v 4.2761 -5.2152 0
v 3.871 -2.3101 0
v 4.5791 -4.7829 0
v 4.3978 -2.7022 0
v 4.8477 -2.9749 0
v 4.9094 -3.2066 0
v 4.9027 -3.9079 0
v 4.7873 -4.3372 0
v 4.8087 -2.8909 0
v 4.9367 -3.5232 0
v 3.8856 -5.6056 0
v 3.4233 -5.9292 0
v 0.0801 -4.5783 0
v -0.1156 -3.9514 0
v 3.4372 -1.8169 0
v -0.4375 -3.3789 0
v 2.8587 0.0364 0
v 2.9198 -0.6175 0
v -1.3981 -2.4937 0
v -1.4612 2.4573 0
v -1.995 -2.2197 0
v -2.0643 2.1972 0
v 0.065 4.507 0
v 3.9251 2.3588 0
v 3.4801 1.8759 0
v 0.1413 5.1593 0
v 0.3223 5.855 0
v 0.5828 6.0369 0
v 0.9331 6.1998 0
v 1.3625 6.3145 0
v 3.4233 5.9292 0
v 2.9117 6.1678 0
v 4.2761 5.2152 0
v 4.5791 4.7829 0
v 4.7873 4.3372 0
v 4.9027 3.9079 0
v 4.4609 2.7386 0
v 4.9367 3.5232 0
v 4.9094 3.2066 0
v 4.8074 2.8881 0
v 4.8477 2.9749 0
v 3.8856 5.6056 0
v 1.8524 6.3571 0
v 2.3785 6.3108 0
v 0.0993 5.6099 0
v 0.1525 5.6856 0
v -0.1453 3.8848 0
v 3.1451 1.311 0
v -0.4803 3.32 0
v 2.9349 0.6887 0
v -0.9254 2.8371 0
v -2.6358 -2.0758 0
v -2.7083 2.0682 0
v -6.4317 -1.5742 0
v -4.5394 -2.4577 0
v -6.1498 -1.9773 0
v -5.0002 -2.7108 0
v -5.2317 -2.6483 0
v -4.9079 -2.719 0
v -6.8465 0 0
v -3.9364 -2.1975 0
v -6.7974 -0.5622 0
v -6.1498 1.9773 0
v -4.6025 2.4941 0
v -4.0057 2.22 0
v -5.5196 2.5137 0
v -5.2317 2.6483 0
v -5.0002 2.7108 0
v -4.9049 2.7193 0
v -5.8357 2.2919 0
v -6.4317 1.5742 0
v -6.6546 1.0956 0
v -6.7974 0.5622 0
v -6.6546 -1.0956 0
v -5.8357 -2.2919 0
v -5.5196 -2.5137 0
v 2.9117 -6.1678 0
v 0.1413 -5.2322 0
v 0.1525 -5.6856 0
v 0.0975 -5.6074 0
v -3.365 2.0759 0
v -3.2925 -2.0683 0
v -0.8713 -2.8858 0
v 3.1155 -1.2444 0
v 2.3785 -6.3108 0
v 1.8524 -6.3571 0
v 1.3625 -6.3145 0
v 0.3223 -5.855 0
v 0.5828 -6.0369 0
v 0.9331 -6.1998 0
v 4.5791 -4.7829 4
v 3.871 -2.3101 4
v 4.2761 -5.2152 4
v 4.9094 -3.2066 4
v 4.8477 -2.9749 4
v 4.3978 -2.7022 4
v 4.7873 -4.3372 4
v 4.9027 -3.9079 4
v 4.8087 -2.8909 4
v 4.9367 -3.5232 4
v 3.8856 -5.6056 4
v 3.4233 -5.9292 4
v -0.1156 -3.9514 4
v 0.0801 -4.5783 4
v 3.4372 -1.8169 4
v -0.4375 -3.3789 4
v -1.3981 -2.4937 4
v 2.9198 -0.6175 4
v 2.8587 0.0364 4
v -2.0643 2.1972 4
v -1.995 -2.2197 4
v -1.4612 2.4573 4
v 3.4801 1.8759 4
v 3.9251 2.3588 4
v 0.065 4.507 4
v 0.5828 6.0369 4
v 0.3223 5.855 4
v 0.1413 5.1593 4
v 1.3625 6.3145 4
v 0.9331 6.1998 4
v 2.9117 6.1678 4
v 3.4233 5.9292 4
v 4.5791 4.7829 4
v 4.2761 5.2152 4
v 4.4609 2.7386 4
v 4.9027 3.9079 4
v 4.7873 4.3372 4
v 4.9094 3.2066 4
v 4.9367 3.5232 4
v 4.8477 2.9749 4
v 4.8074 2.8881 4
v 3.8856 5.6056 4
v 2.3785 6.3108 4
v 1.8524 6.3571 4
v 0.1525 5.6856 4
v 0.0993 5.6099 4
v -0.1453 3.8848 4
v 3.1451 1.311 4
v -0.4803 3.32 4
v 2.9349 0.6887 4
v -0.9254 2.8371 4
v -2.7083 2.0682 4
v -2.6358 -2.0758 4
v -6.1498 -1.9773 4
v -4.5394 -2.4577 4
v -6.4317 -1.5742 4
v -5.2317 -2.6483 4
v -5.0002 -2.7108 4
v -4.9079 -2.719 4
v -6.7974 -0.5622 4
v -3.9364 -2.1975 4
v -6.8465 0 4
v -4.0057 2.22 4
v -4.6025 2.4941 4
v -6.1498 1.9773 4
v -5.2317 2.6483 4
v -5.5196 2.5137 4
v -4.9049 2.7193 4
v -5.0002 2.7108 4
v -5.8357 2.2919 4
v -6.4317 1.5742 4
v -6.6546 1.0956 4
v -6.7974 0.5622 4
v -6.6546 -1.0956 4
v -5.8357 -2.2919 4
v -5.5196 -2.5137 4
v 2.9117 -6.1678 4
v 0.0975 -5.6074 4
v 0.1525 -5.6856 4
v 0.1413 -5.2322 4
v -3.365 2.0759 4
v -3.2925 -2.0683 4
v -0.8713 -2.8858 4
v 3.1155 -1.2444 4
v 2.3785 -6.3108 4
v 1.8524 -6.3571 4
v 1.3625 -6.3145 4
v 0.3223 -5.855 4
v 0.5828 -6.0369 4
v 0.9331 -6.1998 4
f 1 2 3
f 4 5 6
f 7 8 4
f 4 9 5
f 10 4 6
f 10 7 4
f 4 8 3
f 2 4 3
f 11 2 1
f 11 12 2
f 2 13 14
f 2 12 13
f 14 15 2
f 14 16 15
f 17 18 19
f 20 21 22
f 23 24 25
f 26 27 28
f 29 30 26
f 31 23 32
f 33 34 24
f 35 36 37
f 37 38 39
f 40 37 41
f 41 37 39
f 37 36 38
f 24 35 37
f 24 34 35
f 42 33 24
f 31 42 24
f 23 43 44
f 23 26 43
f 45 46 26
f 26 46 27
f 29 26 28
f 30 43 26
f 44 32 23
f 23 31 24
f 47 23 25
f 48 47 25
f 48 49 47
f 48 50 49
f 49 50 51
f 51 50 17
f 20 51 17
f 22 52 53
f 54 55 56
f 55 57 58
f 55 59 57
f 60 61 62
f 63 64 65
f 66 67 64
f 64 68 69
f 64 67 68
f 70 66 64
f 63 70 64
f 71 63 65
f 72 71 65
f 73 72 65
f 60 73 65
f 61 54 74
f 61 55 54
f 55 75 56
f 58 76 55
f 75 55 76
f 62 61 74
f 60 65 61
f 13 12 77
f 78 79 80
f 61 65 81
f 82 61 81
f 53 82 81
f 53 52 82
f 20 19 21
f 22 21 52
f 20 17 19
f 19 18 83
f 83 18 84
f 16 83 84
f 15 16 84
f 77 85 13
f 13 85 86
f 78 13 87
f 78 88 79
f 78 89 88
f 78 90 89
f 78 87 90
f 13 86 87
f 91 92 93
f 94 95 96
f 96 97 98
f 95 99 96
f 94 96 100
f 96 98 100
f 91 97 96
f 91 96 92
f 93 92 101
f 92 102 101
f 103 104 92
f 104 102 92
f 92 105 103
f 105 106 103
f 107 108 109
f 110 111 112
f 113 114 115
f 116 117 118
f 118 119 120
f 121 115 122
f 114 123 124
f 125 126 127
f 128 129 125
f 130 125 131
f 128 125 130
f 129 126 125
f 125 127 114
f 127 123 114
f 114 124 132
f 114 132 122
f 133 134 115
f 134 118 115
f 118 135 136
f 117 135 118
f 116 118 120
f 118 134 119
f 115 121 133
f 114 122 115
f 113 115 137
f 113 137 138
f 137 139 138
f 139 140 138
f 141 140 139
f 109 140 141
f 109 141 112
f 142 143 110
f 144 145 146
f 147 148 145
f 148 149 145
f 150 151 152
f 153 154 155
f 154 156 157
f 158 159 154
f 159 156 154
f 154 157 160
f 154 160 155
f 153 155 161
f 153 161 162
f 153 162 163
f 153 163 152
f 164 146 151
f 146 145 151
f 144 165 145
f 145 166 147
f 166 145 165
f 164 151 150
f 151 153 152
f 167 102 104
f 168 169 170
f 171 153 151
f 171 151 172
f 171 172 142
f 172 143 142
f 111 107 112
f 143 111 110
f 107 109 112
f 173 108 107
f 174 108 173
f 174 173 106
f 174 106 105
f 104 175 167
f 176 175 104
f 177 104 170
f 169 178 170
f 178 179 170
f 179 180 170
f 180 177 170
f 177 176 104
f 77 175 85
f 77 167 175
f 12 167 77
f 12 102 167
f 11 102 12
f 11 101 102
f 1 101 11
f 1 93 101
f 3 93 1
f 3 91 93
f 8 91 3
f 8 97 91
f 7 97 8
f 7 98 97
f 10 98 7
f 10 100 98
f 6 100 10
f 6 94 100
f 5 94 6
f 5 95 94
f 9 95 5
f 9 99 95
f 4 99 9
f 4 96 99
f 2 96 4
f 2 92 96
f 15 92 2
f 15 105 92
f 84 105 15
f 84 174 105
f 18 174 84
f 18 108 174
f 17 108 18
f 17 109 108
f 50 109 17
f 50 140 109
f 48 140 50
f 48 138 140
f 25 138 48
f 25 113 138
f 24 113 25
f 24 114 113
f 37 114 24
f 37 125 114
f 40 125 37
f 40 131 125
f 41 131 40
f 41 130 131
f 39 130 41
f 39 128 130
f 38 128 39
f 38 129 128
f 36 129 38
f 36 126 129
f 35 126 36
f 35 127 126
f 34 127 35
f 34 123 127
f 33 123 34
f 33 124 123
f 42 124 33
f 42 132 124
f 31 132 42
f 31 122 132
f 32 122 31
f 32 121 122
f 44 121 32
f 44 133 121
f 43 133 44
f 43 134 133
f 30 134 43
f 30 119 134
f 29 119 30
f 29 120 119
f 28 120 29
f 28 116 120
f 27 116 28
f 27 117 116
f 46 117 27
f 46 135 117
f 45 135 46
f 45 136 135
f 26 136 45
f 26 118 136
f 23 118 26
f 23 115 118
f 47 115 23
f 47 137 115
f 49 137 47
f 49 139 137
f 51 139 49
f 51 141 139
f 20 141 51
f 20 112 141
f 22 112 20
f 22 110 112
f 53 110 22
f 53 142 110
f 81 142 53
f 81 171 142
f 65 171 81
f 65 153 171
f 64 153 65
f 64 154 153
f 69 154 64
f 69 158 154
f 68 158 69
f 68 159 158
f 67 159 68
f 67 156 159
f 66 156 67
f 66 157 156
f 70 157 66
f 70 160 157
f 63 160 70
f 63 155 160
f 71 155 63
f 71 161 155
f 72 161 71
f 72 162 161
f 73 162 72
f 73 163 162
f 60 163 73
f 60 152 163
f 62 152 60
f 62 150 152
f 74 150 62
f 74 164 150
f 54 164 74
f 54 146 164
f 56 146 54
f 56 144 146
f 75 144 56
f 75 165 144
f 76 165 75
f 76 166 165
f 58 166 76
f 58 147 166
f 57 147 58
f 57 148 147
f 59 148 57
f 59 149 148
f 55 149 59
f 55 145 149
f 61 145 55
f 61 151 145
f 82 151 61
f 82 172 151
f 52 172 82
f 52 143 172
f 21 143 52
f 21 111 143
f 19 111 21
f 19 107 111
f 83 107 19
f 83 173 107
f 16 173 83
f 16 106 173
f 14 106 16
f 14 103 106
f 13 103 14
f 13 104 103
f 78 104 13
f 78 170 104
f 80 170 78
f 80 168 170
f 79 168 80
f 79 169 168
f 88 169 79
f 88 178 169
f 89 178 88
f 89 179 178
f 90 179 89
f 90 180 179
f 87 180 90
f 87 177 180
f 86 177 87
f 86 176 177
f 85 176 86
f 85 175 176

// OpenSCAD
// file: libnema.scad
/*module cycloid(order=30, r=1,n=10,k=1){
     order=n*order;
     R=n*r;
     angles=[ for (i = [0:order-1]) i*(360/order) ];
     coords=[ for (th=angles) [(R-r)*cos(th)+r*cos(th*(R-r)/r), (R-r)*sin(th)-r*sin(th*(R-r)/r)] ];
     rof=r*k*3.1415*.5;
     offset(r=rof,$fn=30)
     polygon(coords);
 }
*/

module cycloid(order=30,r=1,n=10,k=1){
     order=n*order;
     angles=[ for (i = [0:order-1]) i*(360/order) ];
     coords=[ for (th=angles) [r*(n+1)*cos(th)-r*cos((n+1)*th),r*(n+1)*sin(th)-r*sin((n+1)*th)] ];
 rof=-r*k*3.1415*.5;
     offset(r=rof,$fn=30)
     polygon(coords);
}

 module engrane(n=16,rmod=1,rmul=3,ndientes=14){
    n=round(n);
n1=n*ndientes;
omega=360/n1;
theta=180/n1;
r1=rmod*n;
r2=rmul*rmod;
coord=[ for (i=[0:n1-1]) [(r1+r2*sin(i*360/ndientes+theta))*cos(omega*i),(r1+r2*sin(i*360/ndientes+theta))*sin(omega*i)] ];
polygon(coord);
};
 module nema17_holes(d=3){
    for(i=[0:3]){
        translate([31/1.414*cos(90*i+45),31/1.414*sin(90*i+45)])
        circle(d=d,$fn=30);} }

module nema17_eje(s=1){
 scale([s,s])
difference(){
circle(d=5,$fn=100);
translate([4,0])
square(size=[4,10],center=true);
}


module nema17_nut(h=3,d=10,s=1,e=1){
linear_extrude(h)
difference(){
circle(d=d2,$fn=100);
translate([0,e])
nema17_eje(s=s);
}}}


module lever(l=108,h=3,d=7){
    l1=l;
union(){
linear_extrude(h)
difference(){
square(size=[14,l1],center=true);
translate([0,l1/2-7.])
square(size=[10.4,10.4],center=true);
for(i=[1:4])
     translate([0,l1*.5-i*50])
     circle(d=3);
}

translate([0,l1/2-7.])
linear_extrude(h+2)
difference(){
circle(d=10*1.414+d);
//square(size=[14,14],center=true);
square(size=[10.3,10.3],center=true);
}
}

}

module nema17(h=10,d=0){
linear_extrude(h)
difference(){
  intersection(){
square(42,center=true);
    circle(d=54);}
    nema17_holes();
    circle(d=d);
}
}
// main file
include <libnema.scad>
$ndiente=16;
n=3;
n1=8;
r=2;
k=1;
//$t=0;
//ratio
//w2=w0*n/(n+1)*n1/(n1+1)
//w2'=w2-w2=0
//w1'=w1-w2=w0*n/(n+1)(1-n1/(n1+1))
//w0'=w0-w2=w0(1-n/(n+1)*n1/(n1+1))
//a1=n/(n+1)
//a2=n1/(n1+)
//a1*(1-a2)/(1-a1*a2)


$t=10*$t;

angle02=$t*360*n/(n+1)*n1/(n1+1);
angle00=$t*360-angle02;
angle01=$t*360*n/(n+1)-angle02;

// w0=w0
// w2=w2/(w0-w2)=(w2-w0+w0)/(w0-w2)=w0/(w0-w2)-1
//w2=n*n1/((n1+1)*(n+1))/(1-n*n1/(n
//w1=(w1-w2)/(w0-w2)

angle0=$t*360;
angle1=$t*360*angle01/angle00;
angle2=$t*360*angle02/angle00;

//pinion
color([0,1,0])
rotate([0,0,angle0])
linear_extrude(4)
cycloid(n=n,r=r,k=k);

//internal gear
color([1,0,0])
translate([-r*cos(angle2),r*sin(angle2),0])
linear_extrude(2)
rotate([0,0,angle1])
difference(){
cycloid(n=n1,r=r,k=k);
cycloid(n=n+1,r=r,k=k);
}
//external gear

translate([0,0,0])
rotate([0,0,-180])
difference(){
    circle(r=(n1+2)*r);
    cycloid(n=n1+1,r=r);
}
